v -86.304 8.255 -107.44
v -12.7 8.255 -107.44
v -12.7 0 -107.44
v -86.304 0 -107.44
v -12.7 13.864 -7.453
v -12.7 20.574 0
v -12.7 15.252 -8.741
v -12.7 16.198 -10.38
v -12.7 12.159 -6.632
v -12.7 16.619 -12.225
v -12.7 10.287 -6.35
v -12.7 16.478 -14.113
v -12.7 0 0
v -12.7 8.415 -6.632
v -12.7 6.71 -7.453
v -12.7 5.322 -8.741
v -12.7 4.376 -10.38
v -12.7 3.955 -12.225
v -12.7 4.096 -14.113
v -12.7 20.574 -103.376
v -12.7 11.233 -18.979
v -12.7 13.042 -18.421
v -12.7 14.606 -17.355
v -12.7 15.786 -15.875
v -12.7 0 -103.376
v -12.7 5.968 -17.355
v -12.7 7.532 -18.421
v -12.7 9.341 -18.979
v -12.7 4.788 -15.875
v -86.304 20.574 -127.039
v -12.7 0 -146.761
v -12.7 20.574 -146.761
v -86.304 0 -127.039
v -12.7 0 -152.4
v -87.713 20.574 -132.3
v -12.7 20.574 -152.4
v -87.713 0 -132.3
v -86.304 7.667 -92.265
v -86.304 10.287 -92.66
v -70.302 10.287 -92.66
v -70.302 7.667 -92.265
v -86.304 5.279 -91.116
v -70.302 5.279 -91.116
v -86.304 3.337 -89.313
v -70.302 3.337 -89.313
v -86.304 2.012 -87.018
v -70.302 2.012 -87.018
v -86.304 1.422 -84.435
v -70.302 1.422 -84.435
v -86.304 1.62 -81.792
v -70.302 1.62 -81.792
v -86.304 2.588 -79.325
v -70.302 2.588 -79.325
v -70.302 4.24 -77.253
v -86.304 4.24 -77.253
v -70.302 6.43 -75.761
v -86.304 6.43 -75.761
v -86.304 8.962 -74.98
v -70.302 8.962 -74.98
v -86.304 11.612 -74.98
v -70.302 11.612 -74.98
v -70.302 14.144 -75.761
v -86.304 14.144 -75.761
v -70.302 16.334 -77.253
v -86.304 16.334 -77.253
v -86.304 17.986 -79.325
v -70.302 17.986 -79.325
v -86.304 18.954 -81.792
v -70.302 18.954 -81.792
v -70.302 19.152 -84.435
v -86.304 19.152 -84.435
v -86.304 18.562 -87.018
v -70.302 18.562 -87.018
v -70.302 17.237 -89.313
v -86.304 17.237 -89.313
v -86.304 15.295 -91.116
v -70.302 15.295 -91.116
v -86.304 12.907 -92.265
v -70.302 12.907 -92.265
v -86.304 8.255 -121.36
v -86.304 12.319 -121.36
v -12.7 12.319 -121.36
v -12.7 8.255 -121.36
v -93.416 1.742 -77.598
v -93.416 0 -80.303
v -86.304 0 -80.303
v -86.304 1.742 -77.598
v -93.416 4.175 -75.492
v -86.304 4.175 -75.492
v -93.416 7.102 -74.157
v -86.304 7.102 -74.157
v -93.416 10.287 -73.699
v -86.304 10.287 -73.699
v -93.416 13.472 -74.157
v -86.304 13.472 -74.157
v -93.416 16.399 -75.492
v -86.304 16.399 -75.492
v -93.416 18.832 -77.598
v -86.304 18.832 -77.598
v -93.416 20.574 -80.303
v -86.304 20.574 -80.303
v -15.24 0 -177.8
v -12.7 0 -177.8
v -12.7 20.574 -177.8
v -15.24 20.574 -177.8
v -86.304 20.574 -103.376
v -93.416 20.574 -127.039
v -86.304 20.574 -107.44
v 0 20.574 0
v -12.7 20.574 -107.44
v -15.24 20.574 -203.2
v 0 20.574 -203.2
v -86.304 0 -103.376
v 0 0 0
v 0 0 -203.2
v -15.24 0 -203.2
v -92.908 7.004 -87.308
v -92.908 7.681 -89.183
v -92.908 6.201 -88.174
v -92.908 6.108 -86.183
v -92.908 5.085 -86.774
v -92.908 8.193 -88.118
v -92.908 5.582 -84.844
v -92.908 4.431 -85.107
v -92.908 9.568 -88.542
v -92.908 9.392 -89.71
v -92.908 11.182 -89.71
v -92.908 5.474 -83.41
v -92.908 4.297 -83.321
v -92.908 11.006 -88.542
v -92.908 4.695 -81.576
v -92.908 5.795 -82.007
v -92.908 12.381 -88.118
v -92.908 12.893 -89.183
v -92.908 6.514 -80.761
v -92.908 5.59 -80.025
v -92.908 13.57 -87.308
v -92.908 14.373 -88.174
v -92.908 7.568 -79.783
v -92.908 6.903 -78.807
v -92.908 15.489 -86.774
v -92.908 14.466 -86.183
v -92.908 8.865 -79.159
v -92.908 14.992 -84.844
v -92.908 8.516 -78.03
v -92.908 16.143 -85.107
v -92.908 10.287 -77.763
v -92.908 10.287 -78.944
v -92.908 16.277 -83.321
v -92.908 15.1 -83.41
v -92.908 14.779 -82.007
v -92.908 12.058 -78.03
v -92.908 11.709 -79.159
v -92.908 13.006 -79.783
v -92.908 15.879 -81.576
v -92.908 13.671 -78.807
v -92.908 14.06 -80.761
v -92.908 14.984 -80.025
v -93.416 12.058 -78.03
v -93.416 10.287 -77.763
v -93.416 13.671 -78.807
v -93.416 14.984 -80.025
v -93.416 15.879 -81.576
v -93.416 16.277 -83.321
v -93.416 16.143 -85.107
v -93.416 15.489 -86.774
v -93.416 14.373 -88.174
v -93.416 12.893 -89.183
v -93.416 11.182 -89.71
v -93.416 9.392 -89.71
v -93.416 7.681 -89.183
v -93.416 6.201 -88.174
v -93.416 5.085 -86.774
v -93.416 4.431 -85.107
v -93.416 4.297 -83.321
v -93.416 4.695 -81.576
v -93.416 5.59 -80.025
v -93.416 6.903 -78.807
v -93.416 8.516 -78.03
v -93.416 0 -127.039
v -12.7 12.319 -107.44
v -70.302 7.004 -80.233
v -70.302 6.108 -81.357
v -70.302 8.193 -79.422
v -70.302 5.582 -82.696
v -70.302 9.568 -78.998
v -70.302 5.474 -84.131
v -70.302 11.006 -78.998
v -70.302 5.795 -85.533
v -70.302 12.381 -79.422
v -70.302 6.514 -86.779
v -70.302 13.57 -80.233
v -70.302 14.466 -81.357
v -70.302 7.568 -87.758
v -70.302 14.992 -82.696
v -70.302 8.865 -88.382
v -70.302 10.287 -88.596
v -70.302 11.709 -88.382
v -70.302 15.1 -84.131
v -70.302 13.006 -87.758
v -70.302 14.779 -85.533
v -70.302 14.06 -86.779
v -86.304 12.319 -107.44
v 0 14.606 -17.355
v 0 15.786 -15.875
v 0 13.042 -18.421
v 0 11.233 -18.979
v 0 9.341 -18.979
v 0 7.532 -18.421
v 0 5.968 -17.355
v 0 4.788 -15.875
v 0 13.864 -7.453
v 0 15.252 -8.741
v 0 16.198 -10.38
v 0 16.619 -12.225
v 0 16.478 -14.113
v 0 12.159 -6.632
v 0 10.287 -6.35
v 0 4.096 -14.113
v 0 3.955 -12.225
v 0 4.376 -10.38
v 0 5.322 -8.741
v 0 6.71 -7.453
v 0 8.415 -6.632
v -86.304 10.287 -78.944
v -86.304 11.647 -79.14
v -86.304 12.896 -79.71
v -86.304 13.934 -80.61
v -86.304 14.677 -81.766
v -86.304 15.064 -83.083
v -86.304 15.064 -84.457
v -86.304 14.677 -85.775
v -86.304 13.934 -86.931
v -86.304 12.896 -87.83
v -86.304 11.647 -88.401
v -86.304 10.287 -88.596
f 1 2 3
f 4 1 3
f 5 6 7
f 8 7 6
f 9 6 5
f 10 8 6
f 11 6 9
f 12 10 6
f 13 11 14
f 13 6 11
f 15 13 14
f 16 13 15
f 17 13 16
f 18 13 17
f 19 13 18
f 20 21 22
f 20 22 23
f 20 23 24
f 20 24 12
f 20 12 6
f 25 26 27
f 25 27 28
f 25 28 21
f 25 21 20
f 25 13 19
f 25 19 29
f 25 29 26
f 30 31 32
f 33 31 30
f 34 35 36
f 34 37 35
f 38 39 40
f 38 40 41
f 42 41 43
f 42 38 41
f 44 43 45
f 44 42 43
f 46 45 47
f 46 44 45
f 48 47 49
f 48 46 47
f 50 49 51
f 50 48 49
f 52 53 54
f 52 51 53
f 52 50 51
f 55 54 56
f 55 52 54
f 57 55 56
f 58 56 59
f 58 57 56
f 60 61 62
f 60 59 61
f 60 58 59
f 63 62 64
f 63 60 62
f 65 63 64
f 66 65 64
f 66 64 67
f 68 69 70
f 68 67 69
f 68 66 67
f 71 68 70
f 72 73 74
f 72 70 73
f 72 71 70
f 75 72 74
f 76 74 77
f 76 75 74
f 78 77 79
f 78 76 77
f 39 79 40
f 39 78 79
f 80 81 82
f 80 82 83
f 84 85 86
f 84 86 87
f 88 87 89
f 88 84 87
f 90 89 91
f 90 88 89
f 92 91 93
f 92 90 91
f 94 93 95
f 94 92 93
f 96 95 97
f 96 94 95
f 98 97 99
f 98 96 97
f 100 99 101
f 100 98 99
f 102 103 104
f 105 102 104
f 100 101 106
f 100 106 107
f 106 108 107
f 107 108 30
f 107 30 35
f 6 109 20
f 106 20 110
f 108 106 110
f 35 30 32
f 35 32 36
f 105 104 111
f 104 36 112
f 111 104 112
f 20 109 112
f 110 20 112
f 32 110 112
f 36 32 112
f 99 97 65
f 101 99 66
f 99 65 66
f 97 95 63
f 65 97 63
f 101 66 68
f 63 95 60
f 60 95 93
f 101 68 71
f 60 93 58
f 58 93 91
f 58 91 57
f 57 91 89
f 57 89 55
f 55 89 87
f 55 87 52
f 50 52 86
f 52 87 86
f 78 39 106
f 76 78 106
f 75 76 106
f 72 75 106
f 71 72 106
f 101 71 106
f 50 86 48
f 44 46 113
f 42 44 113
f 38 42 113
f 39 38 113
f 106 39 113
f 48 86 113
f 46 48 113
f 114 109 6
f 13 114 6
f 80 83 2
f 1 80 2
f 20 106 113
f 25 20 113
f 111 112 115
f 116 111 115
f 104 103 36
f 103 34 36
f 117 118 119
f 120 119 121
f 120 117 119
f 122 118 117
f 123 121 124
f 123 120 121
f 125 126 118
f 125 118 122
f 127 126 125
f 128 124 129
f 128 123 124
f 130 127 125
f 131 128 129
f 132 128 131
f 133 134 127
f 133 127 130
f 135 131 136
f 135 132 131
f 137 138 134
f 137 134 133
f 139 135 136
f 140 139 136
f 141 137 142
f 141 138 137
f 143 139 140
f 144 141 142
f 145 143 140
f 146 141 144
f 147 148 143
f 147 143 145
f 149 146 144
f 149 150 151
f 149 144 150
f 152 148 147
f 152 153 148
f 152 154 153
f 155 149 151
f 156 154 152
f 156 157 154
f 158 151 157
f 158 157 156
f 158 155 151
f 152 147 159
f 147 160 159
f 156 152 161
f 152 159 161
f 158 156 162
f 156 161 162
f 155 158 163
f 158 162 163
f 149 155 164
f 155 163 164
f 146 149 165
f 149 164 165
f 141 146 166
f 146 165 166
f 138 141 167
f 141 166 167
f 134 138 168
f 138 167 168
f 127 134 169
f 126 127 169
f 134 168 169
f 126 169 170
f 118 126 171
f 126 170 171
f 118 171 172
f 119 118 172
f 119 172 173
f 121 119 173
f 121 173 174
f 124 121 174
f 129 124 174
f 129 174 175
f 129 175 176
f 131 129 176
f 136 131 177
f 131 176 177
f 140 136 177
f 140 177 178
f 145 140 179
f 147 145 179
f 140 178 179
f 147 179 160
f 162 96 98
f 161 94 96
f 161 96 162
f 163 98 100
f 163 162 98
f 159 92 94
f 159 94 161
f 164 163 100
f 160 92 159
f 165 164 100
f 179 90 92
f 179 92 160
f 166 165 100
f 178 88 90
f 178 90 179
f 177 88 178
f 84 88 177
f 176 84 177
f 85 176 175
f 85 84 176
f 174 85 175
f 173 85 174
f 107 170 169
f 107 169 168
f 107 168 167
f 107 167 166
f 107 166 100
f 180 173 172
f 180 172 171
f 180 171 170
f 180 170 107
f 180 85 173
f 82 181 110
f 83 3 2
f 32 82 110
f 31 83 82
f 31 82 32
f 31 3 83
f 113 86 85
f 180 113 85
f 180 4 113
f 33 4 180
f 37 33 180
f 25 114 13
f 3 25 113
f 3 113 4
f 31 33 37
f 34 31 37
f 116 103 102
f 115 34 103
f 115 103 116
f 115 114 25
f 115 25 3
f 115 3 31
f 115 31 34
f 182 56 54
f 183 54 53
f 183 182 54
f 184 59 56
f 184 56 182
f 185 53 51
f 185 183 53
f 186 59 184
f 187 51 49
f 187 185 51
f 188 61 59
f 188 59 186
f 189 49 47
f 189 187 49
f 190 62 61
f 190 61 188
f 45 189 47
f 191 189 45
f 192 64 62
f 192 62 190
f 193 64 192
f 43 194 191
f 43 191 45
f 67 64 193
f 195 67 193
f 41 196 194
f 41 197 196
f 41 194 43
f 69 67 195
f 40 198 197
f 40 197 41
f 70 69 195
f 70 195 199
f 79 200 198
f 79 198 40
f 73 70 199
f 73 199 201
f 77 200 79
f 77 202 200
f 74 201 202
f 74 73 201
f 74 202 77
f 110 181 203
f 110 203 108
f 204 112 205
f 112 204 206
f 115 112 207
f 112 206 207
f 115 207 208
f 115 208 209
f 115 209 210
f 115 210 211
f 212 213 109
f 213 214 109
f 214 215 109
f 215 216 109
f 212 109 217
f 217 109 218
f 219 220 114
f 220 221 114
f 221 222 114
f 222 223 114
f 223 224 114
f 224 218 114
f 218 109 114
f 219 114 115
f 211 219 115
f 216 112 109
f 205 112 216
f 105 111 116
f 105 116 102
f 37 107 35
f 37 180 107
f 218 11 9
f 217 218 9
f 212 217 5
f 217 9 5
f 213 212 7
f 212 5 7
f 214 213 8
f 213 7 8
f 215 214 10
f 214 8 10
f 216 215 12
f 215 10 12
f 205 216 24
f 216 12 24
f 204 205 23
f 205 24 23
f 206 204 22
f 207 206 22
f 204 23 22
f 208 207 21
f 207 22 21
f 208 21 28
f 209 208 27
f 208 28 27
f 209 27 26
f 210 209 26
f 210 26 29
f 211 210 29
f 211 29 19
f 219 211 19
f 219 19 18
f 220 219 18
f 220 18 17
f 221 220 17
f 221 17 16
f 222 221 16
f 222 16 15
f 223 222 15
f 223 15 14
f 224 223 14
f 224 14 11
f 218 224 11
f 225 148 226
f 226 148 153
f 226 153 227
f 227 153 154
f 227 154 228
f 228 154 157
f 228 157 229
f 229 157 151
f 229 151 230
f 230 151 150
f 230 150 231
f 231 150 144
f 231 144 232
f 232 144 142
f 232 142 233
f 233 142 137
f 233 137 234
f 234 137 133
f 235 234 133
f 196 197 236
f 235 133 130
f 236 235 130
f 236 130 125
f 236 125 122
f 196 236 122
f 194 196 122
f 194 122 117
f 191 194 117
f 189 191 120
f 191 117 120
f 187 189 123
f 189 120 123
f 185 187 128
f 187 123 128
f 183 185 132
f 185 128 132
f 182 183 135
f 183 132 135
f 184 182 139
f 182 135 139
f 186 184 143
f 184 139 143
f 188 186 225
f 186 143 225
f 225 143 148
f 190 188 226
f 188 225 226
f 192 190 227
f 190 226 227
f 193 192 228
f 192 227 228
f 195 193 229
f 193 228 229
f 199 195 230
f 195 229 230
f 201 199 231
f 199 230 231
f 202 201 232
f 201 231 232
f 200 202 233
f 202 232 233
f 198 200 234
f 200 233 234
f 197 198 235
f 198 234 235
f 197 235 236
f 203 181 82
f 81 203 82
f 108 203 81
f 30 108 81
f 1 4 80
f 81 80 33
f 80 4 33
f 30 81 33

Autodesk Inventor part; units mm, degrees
ref_plane "YZ Plane" through (0, 0, 0) normal (1, 0, 0) x (0, 1, 0)
ref_plane "XZ Plane" through (0, 0, 0) normal (0, 1, 0) x (-1, 0, 0)
ref_plane "XY Plane" through (0, 0, 0) normal (0, 0, 1) x (1, 0, 0)
sketch "Sketch1" plane through (0, 0, 0) normal (0, 1, 0) x (-1, 0, 0)
  line L0 (0, 0) -> (12.7, 0)
  line L1 (12.7, 0) -> (12.7, -177.8)
  line L2 (12.7, -177.8) -> (0, -177.8)
  line L3 (0, -177.8) -> (0, 0)
  dimension "d0" = 12.7
  dimension "d1" = 177.8
extrude "Extrusion1" add sketch "Sketch1" along normal blind 20.574
sketch "Sketch4" plane through (0, 0, 0) normal (0, -1, 0) x (1, 0, 0)
  line L0 (0, -177.8) -> (-12.7, -177.8) projected
  line L1 (-12.7, -177.8) -> (0, -177.8)
  line L2 (0, -177.8) -> (0, -146.7612)
  line L3 (0, -146.7612) -> (-12.7, -146.7612)
  line L4 (-12.7, -146.7612) -> (-12.7, -177.8)
  line L5 (-12.7, -146.7612) -> (-86.3035, -127.0392)
  line L6 (-12.7, -146.7612) -> (63.5, -146.7612) construction
  line L7 (-86.3035, -127.0392) -> (-86.3035, -73.6992)
  line L8 (-86.3035, -73.6992) -> (-93.4155, -73.6992)
  line L9 (-93.4155, -73.6992) -> (-93.4155, -127.0392)
  line L10 (-12.7, -177.8) -> (0, -177.8)
  line L11 (0, -177.8) -> (0, -152.4)
  line L12 (0, -152.4) -> (-12.7, -152.4)
  line L13 (-12.7, -152.4) -> (-12.7, -177.8)
  line L14 (-12.7, -152.4) -> (-87.7132, -132.3003)
  line L15 (-87.7132, -132.3003) -> (-93.4155, -127.0392)
  point P0 (0, 0)
  dimension "d6" = 12.7
  dimension "d7" = 31.0388
  dimension "d8" = 76.2
  dimension "d9" = 165
  dimension "d10" = 53.34
  dimension "d11" = 7.112
  dimension "d12" = 12.7
  dimension "d13" = 25.4
sketch "Sketch5" plane through (-12.7, 0, -177.8) normal (-1, 0, 0) x (0, 0, 1)
  line L0 (177.8, 20.574) -> (0, 20.574) projected
  line L1 (0, 0) -> (177.8, 0) projected
  line L2 (0, 20.574) -> (31.0403, 20.574)
  line L3 (31.0403, 20.574) -> (31.0403, 0)
  line L4 (31.0403, 0) -> (0, 0)
  line L5 (0, 0) -> (0, 20.574)
  line L6 (31.0403, 10.287) -> (56.4403, 10.287)
  line L7 (56.4403, 10.287) -> (56.4403, 12.319)
  line L8 (56.4403, 12.319) -> (56.4403, 8.255)
  line L9 (56.4403, 8.255) -> (70.3595, 8.255)
  line L10 (70.3595, 8.255) -> (70.3595, 12.319)
  line L11 (70.3595, 12.319) -> (56.4403, 12.319)
  line L12 (70.3595, 12.319) -> (70.3595, 20.574)
  line L13 (70.3595, 8.255) -> (70.3595, 0)
  line L14 (70.3595, 20.574) -> (74.4235, 20.574)
  line L15 (74.4235, 20.574) -> (74.4235, 0)
  line L16 (70.3595, 0) -> (74.4235, 0)
  dimension "d14" = 25.4
  dimension "d15" = 2.032
  dimension "d16" = 4.064
  dimension "d17" = 13.9192
  dimension "d18" = 4.064
extrude "Extrusion2" add sketch "Sketch5" along normal blind 73.66 contours L15 L1 L13 L10 L12 L0 | L10 L9 L8 L7 L11
extrude "Extrusion3" add sketch "Sketch4" against normal blind 20.32 contours L14 L15 L9 L8 L7 L5 L4
sketch "Sketch6" plane through (-12.7, 0, 0) normal (-1, 0, 0) x (0, 0, 1)
  line L0 (0, 0) -> (0, 20.574) projected
  line L1 (0, 10.287) -> (-6.35, 10.287)
  line L2 (-6.35, 10.287) -> (-19.05, 10.287)
  circle A0 centre (-12.7, 10.287) radius 6.35
  dimension "d24" = 12.7
  dimension "d25" = 12.7
extrude "Extrusion4" cut sketch "Sketch6" against normal blind 20.32
sketch "Sketch7" plane through (0, 20.32, 0) normal (0, 1, 0) x (1, 0, 0)
  line L0 (-86.3035, 73.6992) -> (-86.3035, 103.3765) projected
  line L1 (-93.4155, 73.6992) -> (-86.3035, 73.6992) projected
  line L2 (-86.3035, 73.6992) -> (-93.4155, 73.6992)
  line L3 (-93.4155, 73.6992) -> (-93.4155, 127.0392) projected
  line L4 (-93.4155, 73.6992) -> (-93.4155, 127.0392)
  line L5 (-93.4155, 127.0392) -> (-87.7132, 132.3003) projected
  line L6 (-93.4155, 127.0392) -> (-87.7132, 132.3003)
  line L7 (-12.7, 146.7612) -> (-86.3035, 127.0392) projected
  line L8 (-86.3035, 73.6992) -> (-86.3035, 127.0392)
  line L9 (-86.3035, 127.0392) -> (-12.7, 146.7612)
  line L10 (-12.7, 177.8) -> (-12.7, 107.4405) projected
  line L11 (-12.7, 146.7612) -> (-12.7, 152.4)
  line L12 (-87.7132, 132.3003) -> (-12.7, 152.4) projected
  line L13 (-12.7, 152.4) -> (-87.7132, 132.3003)
  point P0 (0, 0)
  dimension "d30" = 76.2
  dimension "d31" = 5.6388
extrude "Extrusion5" add sketch "Sketch7" along normal blind 0.254
sketch "Sketch8" plane through (-93.4155, 0, -127.0392) normal (-1, 0, 0) x (0, 0, 1)
  line L0 (53.34, 0) -> (53.34, 20.574) projected
  line L1 (53.34, 20.574) -> (46.736, 20.574)
  line L2 (0, 20.574) -> (53.34, 20.574) projected
  line L3 (46.736, 20.574) -> (46.736, 0)
  line L4 (53.34, 0) -> (0, 0) projected
  arc A0 (46.736, 0) -> (46.736, 20.574) centre (42.026, 10.287) ccw
  point P0 (127.0392, 0)
  dimension "d34" = 6.604
extrude "Extrusion6" cut sketch "Sketch8" against normal blind 25.4 contours L4 A0 L0 | A0 L1 L0
sketch "Sketch9" plane through (-93.4155, 0, -127.0392) normal (-1, 0, 0) x (0, 0, 1)
  arc A0 (46.736, 0) -> (46.736, 20.574) centre (42.026, 10.287) ccw projected
  line L0 (53.34, 10.287) -> (49.276, 10.287)
  line L1 (49.276, 10.287) -> (37.2618, 10.287)
  circle A1 centre (43.2689, 10.287) radius 6.0071
  point P0 (127.0392, 0)
  dimension "d37" = 4.064
  dimension "d38" = 12.0142
extrude "Extrusion7" cut sketch "Sketch9" against normal blind 0.508
sketch "Sketch11" plane through (-92.9075, 10.287, -83.7703) normal (-1, 0, 0) x (0, 0, 1)
  circle A0 centre (0, 0) radius 4.826
  point P0 (83.7703, -10.287)
  dimension "d41" = 9.652
extrude "Extrusion8" cut sketch "Sketch11" against normal blind 22.86
sketch "Sketch12" plane through (-86.3035, 0, -103.3765) normal (1, 0, 0) x (0, 0, -1)
  circle A0 centre (-19.6062, 10.287) radius 6.0071 projected
  circle A1 centre (-19.6062, 10.287) radius 8.89
  point P0 (-103.3765, 0)
  dimension "d44" = 17.78
extrude "Extrusion9" add sketch "Sketch12" along normal blind 16.002
sketch "Sketch13" plane through (-86.3035, 10.287, -83.7703) normal (1, 0, 0) x (0, 0, -1)
  circle A0 centre (0, 0) radius 4.826 projected
  circle A1 centre (0, 0) radius 4.826
  circle A2 centre (0, 0) radius 6.0071
  point P0 (-83.7703, -10.287)
extrude "Extrusion10" add sketch "Sketch13" along normal blind 16.002
sketch "Sketch21" plane through (0, 0, -177.8) normal (0, 0, -1) x (-1, 0, 0)
  line L0 (0, 0) -> (12.7, 0)
  line L1 (12.7, 0) -> (12.7, 20.574)
  line L2 (12.7, 20.574) -> (0, 20.574)
  line L3 (0, 20.574) -> (0, 0)
extrude "Extrusion14" add sketch "Sketch21" along normal blind 25.4
sketch "Sketch22" plane through (-12.7, 0, -152.4) normal (-1, 0, 0) x (0, 0, 1)
  line L0 (0, 0) -> (-50.8, 0) projected
  line L1 (0, 20.574) -> (-50.8, 20.574) projected
  line L2 (-50.8, 0) -> (-25.4, 0)
  line L3 (-25.4, 0) -> (-25.4, 20.574)
  line L4 (-25.4, 20.574) -> (-50.8, 20.574)
  line L5 (-50.8, 20.574) -> (-50.8, 0)
  point P0 (152.4, 0)
extrude "Extrusion15" add sketch "Sketch22" along normal blind 2.54
properties part number "steeringBracket" material "Steel, Carbon"
